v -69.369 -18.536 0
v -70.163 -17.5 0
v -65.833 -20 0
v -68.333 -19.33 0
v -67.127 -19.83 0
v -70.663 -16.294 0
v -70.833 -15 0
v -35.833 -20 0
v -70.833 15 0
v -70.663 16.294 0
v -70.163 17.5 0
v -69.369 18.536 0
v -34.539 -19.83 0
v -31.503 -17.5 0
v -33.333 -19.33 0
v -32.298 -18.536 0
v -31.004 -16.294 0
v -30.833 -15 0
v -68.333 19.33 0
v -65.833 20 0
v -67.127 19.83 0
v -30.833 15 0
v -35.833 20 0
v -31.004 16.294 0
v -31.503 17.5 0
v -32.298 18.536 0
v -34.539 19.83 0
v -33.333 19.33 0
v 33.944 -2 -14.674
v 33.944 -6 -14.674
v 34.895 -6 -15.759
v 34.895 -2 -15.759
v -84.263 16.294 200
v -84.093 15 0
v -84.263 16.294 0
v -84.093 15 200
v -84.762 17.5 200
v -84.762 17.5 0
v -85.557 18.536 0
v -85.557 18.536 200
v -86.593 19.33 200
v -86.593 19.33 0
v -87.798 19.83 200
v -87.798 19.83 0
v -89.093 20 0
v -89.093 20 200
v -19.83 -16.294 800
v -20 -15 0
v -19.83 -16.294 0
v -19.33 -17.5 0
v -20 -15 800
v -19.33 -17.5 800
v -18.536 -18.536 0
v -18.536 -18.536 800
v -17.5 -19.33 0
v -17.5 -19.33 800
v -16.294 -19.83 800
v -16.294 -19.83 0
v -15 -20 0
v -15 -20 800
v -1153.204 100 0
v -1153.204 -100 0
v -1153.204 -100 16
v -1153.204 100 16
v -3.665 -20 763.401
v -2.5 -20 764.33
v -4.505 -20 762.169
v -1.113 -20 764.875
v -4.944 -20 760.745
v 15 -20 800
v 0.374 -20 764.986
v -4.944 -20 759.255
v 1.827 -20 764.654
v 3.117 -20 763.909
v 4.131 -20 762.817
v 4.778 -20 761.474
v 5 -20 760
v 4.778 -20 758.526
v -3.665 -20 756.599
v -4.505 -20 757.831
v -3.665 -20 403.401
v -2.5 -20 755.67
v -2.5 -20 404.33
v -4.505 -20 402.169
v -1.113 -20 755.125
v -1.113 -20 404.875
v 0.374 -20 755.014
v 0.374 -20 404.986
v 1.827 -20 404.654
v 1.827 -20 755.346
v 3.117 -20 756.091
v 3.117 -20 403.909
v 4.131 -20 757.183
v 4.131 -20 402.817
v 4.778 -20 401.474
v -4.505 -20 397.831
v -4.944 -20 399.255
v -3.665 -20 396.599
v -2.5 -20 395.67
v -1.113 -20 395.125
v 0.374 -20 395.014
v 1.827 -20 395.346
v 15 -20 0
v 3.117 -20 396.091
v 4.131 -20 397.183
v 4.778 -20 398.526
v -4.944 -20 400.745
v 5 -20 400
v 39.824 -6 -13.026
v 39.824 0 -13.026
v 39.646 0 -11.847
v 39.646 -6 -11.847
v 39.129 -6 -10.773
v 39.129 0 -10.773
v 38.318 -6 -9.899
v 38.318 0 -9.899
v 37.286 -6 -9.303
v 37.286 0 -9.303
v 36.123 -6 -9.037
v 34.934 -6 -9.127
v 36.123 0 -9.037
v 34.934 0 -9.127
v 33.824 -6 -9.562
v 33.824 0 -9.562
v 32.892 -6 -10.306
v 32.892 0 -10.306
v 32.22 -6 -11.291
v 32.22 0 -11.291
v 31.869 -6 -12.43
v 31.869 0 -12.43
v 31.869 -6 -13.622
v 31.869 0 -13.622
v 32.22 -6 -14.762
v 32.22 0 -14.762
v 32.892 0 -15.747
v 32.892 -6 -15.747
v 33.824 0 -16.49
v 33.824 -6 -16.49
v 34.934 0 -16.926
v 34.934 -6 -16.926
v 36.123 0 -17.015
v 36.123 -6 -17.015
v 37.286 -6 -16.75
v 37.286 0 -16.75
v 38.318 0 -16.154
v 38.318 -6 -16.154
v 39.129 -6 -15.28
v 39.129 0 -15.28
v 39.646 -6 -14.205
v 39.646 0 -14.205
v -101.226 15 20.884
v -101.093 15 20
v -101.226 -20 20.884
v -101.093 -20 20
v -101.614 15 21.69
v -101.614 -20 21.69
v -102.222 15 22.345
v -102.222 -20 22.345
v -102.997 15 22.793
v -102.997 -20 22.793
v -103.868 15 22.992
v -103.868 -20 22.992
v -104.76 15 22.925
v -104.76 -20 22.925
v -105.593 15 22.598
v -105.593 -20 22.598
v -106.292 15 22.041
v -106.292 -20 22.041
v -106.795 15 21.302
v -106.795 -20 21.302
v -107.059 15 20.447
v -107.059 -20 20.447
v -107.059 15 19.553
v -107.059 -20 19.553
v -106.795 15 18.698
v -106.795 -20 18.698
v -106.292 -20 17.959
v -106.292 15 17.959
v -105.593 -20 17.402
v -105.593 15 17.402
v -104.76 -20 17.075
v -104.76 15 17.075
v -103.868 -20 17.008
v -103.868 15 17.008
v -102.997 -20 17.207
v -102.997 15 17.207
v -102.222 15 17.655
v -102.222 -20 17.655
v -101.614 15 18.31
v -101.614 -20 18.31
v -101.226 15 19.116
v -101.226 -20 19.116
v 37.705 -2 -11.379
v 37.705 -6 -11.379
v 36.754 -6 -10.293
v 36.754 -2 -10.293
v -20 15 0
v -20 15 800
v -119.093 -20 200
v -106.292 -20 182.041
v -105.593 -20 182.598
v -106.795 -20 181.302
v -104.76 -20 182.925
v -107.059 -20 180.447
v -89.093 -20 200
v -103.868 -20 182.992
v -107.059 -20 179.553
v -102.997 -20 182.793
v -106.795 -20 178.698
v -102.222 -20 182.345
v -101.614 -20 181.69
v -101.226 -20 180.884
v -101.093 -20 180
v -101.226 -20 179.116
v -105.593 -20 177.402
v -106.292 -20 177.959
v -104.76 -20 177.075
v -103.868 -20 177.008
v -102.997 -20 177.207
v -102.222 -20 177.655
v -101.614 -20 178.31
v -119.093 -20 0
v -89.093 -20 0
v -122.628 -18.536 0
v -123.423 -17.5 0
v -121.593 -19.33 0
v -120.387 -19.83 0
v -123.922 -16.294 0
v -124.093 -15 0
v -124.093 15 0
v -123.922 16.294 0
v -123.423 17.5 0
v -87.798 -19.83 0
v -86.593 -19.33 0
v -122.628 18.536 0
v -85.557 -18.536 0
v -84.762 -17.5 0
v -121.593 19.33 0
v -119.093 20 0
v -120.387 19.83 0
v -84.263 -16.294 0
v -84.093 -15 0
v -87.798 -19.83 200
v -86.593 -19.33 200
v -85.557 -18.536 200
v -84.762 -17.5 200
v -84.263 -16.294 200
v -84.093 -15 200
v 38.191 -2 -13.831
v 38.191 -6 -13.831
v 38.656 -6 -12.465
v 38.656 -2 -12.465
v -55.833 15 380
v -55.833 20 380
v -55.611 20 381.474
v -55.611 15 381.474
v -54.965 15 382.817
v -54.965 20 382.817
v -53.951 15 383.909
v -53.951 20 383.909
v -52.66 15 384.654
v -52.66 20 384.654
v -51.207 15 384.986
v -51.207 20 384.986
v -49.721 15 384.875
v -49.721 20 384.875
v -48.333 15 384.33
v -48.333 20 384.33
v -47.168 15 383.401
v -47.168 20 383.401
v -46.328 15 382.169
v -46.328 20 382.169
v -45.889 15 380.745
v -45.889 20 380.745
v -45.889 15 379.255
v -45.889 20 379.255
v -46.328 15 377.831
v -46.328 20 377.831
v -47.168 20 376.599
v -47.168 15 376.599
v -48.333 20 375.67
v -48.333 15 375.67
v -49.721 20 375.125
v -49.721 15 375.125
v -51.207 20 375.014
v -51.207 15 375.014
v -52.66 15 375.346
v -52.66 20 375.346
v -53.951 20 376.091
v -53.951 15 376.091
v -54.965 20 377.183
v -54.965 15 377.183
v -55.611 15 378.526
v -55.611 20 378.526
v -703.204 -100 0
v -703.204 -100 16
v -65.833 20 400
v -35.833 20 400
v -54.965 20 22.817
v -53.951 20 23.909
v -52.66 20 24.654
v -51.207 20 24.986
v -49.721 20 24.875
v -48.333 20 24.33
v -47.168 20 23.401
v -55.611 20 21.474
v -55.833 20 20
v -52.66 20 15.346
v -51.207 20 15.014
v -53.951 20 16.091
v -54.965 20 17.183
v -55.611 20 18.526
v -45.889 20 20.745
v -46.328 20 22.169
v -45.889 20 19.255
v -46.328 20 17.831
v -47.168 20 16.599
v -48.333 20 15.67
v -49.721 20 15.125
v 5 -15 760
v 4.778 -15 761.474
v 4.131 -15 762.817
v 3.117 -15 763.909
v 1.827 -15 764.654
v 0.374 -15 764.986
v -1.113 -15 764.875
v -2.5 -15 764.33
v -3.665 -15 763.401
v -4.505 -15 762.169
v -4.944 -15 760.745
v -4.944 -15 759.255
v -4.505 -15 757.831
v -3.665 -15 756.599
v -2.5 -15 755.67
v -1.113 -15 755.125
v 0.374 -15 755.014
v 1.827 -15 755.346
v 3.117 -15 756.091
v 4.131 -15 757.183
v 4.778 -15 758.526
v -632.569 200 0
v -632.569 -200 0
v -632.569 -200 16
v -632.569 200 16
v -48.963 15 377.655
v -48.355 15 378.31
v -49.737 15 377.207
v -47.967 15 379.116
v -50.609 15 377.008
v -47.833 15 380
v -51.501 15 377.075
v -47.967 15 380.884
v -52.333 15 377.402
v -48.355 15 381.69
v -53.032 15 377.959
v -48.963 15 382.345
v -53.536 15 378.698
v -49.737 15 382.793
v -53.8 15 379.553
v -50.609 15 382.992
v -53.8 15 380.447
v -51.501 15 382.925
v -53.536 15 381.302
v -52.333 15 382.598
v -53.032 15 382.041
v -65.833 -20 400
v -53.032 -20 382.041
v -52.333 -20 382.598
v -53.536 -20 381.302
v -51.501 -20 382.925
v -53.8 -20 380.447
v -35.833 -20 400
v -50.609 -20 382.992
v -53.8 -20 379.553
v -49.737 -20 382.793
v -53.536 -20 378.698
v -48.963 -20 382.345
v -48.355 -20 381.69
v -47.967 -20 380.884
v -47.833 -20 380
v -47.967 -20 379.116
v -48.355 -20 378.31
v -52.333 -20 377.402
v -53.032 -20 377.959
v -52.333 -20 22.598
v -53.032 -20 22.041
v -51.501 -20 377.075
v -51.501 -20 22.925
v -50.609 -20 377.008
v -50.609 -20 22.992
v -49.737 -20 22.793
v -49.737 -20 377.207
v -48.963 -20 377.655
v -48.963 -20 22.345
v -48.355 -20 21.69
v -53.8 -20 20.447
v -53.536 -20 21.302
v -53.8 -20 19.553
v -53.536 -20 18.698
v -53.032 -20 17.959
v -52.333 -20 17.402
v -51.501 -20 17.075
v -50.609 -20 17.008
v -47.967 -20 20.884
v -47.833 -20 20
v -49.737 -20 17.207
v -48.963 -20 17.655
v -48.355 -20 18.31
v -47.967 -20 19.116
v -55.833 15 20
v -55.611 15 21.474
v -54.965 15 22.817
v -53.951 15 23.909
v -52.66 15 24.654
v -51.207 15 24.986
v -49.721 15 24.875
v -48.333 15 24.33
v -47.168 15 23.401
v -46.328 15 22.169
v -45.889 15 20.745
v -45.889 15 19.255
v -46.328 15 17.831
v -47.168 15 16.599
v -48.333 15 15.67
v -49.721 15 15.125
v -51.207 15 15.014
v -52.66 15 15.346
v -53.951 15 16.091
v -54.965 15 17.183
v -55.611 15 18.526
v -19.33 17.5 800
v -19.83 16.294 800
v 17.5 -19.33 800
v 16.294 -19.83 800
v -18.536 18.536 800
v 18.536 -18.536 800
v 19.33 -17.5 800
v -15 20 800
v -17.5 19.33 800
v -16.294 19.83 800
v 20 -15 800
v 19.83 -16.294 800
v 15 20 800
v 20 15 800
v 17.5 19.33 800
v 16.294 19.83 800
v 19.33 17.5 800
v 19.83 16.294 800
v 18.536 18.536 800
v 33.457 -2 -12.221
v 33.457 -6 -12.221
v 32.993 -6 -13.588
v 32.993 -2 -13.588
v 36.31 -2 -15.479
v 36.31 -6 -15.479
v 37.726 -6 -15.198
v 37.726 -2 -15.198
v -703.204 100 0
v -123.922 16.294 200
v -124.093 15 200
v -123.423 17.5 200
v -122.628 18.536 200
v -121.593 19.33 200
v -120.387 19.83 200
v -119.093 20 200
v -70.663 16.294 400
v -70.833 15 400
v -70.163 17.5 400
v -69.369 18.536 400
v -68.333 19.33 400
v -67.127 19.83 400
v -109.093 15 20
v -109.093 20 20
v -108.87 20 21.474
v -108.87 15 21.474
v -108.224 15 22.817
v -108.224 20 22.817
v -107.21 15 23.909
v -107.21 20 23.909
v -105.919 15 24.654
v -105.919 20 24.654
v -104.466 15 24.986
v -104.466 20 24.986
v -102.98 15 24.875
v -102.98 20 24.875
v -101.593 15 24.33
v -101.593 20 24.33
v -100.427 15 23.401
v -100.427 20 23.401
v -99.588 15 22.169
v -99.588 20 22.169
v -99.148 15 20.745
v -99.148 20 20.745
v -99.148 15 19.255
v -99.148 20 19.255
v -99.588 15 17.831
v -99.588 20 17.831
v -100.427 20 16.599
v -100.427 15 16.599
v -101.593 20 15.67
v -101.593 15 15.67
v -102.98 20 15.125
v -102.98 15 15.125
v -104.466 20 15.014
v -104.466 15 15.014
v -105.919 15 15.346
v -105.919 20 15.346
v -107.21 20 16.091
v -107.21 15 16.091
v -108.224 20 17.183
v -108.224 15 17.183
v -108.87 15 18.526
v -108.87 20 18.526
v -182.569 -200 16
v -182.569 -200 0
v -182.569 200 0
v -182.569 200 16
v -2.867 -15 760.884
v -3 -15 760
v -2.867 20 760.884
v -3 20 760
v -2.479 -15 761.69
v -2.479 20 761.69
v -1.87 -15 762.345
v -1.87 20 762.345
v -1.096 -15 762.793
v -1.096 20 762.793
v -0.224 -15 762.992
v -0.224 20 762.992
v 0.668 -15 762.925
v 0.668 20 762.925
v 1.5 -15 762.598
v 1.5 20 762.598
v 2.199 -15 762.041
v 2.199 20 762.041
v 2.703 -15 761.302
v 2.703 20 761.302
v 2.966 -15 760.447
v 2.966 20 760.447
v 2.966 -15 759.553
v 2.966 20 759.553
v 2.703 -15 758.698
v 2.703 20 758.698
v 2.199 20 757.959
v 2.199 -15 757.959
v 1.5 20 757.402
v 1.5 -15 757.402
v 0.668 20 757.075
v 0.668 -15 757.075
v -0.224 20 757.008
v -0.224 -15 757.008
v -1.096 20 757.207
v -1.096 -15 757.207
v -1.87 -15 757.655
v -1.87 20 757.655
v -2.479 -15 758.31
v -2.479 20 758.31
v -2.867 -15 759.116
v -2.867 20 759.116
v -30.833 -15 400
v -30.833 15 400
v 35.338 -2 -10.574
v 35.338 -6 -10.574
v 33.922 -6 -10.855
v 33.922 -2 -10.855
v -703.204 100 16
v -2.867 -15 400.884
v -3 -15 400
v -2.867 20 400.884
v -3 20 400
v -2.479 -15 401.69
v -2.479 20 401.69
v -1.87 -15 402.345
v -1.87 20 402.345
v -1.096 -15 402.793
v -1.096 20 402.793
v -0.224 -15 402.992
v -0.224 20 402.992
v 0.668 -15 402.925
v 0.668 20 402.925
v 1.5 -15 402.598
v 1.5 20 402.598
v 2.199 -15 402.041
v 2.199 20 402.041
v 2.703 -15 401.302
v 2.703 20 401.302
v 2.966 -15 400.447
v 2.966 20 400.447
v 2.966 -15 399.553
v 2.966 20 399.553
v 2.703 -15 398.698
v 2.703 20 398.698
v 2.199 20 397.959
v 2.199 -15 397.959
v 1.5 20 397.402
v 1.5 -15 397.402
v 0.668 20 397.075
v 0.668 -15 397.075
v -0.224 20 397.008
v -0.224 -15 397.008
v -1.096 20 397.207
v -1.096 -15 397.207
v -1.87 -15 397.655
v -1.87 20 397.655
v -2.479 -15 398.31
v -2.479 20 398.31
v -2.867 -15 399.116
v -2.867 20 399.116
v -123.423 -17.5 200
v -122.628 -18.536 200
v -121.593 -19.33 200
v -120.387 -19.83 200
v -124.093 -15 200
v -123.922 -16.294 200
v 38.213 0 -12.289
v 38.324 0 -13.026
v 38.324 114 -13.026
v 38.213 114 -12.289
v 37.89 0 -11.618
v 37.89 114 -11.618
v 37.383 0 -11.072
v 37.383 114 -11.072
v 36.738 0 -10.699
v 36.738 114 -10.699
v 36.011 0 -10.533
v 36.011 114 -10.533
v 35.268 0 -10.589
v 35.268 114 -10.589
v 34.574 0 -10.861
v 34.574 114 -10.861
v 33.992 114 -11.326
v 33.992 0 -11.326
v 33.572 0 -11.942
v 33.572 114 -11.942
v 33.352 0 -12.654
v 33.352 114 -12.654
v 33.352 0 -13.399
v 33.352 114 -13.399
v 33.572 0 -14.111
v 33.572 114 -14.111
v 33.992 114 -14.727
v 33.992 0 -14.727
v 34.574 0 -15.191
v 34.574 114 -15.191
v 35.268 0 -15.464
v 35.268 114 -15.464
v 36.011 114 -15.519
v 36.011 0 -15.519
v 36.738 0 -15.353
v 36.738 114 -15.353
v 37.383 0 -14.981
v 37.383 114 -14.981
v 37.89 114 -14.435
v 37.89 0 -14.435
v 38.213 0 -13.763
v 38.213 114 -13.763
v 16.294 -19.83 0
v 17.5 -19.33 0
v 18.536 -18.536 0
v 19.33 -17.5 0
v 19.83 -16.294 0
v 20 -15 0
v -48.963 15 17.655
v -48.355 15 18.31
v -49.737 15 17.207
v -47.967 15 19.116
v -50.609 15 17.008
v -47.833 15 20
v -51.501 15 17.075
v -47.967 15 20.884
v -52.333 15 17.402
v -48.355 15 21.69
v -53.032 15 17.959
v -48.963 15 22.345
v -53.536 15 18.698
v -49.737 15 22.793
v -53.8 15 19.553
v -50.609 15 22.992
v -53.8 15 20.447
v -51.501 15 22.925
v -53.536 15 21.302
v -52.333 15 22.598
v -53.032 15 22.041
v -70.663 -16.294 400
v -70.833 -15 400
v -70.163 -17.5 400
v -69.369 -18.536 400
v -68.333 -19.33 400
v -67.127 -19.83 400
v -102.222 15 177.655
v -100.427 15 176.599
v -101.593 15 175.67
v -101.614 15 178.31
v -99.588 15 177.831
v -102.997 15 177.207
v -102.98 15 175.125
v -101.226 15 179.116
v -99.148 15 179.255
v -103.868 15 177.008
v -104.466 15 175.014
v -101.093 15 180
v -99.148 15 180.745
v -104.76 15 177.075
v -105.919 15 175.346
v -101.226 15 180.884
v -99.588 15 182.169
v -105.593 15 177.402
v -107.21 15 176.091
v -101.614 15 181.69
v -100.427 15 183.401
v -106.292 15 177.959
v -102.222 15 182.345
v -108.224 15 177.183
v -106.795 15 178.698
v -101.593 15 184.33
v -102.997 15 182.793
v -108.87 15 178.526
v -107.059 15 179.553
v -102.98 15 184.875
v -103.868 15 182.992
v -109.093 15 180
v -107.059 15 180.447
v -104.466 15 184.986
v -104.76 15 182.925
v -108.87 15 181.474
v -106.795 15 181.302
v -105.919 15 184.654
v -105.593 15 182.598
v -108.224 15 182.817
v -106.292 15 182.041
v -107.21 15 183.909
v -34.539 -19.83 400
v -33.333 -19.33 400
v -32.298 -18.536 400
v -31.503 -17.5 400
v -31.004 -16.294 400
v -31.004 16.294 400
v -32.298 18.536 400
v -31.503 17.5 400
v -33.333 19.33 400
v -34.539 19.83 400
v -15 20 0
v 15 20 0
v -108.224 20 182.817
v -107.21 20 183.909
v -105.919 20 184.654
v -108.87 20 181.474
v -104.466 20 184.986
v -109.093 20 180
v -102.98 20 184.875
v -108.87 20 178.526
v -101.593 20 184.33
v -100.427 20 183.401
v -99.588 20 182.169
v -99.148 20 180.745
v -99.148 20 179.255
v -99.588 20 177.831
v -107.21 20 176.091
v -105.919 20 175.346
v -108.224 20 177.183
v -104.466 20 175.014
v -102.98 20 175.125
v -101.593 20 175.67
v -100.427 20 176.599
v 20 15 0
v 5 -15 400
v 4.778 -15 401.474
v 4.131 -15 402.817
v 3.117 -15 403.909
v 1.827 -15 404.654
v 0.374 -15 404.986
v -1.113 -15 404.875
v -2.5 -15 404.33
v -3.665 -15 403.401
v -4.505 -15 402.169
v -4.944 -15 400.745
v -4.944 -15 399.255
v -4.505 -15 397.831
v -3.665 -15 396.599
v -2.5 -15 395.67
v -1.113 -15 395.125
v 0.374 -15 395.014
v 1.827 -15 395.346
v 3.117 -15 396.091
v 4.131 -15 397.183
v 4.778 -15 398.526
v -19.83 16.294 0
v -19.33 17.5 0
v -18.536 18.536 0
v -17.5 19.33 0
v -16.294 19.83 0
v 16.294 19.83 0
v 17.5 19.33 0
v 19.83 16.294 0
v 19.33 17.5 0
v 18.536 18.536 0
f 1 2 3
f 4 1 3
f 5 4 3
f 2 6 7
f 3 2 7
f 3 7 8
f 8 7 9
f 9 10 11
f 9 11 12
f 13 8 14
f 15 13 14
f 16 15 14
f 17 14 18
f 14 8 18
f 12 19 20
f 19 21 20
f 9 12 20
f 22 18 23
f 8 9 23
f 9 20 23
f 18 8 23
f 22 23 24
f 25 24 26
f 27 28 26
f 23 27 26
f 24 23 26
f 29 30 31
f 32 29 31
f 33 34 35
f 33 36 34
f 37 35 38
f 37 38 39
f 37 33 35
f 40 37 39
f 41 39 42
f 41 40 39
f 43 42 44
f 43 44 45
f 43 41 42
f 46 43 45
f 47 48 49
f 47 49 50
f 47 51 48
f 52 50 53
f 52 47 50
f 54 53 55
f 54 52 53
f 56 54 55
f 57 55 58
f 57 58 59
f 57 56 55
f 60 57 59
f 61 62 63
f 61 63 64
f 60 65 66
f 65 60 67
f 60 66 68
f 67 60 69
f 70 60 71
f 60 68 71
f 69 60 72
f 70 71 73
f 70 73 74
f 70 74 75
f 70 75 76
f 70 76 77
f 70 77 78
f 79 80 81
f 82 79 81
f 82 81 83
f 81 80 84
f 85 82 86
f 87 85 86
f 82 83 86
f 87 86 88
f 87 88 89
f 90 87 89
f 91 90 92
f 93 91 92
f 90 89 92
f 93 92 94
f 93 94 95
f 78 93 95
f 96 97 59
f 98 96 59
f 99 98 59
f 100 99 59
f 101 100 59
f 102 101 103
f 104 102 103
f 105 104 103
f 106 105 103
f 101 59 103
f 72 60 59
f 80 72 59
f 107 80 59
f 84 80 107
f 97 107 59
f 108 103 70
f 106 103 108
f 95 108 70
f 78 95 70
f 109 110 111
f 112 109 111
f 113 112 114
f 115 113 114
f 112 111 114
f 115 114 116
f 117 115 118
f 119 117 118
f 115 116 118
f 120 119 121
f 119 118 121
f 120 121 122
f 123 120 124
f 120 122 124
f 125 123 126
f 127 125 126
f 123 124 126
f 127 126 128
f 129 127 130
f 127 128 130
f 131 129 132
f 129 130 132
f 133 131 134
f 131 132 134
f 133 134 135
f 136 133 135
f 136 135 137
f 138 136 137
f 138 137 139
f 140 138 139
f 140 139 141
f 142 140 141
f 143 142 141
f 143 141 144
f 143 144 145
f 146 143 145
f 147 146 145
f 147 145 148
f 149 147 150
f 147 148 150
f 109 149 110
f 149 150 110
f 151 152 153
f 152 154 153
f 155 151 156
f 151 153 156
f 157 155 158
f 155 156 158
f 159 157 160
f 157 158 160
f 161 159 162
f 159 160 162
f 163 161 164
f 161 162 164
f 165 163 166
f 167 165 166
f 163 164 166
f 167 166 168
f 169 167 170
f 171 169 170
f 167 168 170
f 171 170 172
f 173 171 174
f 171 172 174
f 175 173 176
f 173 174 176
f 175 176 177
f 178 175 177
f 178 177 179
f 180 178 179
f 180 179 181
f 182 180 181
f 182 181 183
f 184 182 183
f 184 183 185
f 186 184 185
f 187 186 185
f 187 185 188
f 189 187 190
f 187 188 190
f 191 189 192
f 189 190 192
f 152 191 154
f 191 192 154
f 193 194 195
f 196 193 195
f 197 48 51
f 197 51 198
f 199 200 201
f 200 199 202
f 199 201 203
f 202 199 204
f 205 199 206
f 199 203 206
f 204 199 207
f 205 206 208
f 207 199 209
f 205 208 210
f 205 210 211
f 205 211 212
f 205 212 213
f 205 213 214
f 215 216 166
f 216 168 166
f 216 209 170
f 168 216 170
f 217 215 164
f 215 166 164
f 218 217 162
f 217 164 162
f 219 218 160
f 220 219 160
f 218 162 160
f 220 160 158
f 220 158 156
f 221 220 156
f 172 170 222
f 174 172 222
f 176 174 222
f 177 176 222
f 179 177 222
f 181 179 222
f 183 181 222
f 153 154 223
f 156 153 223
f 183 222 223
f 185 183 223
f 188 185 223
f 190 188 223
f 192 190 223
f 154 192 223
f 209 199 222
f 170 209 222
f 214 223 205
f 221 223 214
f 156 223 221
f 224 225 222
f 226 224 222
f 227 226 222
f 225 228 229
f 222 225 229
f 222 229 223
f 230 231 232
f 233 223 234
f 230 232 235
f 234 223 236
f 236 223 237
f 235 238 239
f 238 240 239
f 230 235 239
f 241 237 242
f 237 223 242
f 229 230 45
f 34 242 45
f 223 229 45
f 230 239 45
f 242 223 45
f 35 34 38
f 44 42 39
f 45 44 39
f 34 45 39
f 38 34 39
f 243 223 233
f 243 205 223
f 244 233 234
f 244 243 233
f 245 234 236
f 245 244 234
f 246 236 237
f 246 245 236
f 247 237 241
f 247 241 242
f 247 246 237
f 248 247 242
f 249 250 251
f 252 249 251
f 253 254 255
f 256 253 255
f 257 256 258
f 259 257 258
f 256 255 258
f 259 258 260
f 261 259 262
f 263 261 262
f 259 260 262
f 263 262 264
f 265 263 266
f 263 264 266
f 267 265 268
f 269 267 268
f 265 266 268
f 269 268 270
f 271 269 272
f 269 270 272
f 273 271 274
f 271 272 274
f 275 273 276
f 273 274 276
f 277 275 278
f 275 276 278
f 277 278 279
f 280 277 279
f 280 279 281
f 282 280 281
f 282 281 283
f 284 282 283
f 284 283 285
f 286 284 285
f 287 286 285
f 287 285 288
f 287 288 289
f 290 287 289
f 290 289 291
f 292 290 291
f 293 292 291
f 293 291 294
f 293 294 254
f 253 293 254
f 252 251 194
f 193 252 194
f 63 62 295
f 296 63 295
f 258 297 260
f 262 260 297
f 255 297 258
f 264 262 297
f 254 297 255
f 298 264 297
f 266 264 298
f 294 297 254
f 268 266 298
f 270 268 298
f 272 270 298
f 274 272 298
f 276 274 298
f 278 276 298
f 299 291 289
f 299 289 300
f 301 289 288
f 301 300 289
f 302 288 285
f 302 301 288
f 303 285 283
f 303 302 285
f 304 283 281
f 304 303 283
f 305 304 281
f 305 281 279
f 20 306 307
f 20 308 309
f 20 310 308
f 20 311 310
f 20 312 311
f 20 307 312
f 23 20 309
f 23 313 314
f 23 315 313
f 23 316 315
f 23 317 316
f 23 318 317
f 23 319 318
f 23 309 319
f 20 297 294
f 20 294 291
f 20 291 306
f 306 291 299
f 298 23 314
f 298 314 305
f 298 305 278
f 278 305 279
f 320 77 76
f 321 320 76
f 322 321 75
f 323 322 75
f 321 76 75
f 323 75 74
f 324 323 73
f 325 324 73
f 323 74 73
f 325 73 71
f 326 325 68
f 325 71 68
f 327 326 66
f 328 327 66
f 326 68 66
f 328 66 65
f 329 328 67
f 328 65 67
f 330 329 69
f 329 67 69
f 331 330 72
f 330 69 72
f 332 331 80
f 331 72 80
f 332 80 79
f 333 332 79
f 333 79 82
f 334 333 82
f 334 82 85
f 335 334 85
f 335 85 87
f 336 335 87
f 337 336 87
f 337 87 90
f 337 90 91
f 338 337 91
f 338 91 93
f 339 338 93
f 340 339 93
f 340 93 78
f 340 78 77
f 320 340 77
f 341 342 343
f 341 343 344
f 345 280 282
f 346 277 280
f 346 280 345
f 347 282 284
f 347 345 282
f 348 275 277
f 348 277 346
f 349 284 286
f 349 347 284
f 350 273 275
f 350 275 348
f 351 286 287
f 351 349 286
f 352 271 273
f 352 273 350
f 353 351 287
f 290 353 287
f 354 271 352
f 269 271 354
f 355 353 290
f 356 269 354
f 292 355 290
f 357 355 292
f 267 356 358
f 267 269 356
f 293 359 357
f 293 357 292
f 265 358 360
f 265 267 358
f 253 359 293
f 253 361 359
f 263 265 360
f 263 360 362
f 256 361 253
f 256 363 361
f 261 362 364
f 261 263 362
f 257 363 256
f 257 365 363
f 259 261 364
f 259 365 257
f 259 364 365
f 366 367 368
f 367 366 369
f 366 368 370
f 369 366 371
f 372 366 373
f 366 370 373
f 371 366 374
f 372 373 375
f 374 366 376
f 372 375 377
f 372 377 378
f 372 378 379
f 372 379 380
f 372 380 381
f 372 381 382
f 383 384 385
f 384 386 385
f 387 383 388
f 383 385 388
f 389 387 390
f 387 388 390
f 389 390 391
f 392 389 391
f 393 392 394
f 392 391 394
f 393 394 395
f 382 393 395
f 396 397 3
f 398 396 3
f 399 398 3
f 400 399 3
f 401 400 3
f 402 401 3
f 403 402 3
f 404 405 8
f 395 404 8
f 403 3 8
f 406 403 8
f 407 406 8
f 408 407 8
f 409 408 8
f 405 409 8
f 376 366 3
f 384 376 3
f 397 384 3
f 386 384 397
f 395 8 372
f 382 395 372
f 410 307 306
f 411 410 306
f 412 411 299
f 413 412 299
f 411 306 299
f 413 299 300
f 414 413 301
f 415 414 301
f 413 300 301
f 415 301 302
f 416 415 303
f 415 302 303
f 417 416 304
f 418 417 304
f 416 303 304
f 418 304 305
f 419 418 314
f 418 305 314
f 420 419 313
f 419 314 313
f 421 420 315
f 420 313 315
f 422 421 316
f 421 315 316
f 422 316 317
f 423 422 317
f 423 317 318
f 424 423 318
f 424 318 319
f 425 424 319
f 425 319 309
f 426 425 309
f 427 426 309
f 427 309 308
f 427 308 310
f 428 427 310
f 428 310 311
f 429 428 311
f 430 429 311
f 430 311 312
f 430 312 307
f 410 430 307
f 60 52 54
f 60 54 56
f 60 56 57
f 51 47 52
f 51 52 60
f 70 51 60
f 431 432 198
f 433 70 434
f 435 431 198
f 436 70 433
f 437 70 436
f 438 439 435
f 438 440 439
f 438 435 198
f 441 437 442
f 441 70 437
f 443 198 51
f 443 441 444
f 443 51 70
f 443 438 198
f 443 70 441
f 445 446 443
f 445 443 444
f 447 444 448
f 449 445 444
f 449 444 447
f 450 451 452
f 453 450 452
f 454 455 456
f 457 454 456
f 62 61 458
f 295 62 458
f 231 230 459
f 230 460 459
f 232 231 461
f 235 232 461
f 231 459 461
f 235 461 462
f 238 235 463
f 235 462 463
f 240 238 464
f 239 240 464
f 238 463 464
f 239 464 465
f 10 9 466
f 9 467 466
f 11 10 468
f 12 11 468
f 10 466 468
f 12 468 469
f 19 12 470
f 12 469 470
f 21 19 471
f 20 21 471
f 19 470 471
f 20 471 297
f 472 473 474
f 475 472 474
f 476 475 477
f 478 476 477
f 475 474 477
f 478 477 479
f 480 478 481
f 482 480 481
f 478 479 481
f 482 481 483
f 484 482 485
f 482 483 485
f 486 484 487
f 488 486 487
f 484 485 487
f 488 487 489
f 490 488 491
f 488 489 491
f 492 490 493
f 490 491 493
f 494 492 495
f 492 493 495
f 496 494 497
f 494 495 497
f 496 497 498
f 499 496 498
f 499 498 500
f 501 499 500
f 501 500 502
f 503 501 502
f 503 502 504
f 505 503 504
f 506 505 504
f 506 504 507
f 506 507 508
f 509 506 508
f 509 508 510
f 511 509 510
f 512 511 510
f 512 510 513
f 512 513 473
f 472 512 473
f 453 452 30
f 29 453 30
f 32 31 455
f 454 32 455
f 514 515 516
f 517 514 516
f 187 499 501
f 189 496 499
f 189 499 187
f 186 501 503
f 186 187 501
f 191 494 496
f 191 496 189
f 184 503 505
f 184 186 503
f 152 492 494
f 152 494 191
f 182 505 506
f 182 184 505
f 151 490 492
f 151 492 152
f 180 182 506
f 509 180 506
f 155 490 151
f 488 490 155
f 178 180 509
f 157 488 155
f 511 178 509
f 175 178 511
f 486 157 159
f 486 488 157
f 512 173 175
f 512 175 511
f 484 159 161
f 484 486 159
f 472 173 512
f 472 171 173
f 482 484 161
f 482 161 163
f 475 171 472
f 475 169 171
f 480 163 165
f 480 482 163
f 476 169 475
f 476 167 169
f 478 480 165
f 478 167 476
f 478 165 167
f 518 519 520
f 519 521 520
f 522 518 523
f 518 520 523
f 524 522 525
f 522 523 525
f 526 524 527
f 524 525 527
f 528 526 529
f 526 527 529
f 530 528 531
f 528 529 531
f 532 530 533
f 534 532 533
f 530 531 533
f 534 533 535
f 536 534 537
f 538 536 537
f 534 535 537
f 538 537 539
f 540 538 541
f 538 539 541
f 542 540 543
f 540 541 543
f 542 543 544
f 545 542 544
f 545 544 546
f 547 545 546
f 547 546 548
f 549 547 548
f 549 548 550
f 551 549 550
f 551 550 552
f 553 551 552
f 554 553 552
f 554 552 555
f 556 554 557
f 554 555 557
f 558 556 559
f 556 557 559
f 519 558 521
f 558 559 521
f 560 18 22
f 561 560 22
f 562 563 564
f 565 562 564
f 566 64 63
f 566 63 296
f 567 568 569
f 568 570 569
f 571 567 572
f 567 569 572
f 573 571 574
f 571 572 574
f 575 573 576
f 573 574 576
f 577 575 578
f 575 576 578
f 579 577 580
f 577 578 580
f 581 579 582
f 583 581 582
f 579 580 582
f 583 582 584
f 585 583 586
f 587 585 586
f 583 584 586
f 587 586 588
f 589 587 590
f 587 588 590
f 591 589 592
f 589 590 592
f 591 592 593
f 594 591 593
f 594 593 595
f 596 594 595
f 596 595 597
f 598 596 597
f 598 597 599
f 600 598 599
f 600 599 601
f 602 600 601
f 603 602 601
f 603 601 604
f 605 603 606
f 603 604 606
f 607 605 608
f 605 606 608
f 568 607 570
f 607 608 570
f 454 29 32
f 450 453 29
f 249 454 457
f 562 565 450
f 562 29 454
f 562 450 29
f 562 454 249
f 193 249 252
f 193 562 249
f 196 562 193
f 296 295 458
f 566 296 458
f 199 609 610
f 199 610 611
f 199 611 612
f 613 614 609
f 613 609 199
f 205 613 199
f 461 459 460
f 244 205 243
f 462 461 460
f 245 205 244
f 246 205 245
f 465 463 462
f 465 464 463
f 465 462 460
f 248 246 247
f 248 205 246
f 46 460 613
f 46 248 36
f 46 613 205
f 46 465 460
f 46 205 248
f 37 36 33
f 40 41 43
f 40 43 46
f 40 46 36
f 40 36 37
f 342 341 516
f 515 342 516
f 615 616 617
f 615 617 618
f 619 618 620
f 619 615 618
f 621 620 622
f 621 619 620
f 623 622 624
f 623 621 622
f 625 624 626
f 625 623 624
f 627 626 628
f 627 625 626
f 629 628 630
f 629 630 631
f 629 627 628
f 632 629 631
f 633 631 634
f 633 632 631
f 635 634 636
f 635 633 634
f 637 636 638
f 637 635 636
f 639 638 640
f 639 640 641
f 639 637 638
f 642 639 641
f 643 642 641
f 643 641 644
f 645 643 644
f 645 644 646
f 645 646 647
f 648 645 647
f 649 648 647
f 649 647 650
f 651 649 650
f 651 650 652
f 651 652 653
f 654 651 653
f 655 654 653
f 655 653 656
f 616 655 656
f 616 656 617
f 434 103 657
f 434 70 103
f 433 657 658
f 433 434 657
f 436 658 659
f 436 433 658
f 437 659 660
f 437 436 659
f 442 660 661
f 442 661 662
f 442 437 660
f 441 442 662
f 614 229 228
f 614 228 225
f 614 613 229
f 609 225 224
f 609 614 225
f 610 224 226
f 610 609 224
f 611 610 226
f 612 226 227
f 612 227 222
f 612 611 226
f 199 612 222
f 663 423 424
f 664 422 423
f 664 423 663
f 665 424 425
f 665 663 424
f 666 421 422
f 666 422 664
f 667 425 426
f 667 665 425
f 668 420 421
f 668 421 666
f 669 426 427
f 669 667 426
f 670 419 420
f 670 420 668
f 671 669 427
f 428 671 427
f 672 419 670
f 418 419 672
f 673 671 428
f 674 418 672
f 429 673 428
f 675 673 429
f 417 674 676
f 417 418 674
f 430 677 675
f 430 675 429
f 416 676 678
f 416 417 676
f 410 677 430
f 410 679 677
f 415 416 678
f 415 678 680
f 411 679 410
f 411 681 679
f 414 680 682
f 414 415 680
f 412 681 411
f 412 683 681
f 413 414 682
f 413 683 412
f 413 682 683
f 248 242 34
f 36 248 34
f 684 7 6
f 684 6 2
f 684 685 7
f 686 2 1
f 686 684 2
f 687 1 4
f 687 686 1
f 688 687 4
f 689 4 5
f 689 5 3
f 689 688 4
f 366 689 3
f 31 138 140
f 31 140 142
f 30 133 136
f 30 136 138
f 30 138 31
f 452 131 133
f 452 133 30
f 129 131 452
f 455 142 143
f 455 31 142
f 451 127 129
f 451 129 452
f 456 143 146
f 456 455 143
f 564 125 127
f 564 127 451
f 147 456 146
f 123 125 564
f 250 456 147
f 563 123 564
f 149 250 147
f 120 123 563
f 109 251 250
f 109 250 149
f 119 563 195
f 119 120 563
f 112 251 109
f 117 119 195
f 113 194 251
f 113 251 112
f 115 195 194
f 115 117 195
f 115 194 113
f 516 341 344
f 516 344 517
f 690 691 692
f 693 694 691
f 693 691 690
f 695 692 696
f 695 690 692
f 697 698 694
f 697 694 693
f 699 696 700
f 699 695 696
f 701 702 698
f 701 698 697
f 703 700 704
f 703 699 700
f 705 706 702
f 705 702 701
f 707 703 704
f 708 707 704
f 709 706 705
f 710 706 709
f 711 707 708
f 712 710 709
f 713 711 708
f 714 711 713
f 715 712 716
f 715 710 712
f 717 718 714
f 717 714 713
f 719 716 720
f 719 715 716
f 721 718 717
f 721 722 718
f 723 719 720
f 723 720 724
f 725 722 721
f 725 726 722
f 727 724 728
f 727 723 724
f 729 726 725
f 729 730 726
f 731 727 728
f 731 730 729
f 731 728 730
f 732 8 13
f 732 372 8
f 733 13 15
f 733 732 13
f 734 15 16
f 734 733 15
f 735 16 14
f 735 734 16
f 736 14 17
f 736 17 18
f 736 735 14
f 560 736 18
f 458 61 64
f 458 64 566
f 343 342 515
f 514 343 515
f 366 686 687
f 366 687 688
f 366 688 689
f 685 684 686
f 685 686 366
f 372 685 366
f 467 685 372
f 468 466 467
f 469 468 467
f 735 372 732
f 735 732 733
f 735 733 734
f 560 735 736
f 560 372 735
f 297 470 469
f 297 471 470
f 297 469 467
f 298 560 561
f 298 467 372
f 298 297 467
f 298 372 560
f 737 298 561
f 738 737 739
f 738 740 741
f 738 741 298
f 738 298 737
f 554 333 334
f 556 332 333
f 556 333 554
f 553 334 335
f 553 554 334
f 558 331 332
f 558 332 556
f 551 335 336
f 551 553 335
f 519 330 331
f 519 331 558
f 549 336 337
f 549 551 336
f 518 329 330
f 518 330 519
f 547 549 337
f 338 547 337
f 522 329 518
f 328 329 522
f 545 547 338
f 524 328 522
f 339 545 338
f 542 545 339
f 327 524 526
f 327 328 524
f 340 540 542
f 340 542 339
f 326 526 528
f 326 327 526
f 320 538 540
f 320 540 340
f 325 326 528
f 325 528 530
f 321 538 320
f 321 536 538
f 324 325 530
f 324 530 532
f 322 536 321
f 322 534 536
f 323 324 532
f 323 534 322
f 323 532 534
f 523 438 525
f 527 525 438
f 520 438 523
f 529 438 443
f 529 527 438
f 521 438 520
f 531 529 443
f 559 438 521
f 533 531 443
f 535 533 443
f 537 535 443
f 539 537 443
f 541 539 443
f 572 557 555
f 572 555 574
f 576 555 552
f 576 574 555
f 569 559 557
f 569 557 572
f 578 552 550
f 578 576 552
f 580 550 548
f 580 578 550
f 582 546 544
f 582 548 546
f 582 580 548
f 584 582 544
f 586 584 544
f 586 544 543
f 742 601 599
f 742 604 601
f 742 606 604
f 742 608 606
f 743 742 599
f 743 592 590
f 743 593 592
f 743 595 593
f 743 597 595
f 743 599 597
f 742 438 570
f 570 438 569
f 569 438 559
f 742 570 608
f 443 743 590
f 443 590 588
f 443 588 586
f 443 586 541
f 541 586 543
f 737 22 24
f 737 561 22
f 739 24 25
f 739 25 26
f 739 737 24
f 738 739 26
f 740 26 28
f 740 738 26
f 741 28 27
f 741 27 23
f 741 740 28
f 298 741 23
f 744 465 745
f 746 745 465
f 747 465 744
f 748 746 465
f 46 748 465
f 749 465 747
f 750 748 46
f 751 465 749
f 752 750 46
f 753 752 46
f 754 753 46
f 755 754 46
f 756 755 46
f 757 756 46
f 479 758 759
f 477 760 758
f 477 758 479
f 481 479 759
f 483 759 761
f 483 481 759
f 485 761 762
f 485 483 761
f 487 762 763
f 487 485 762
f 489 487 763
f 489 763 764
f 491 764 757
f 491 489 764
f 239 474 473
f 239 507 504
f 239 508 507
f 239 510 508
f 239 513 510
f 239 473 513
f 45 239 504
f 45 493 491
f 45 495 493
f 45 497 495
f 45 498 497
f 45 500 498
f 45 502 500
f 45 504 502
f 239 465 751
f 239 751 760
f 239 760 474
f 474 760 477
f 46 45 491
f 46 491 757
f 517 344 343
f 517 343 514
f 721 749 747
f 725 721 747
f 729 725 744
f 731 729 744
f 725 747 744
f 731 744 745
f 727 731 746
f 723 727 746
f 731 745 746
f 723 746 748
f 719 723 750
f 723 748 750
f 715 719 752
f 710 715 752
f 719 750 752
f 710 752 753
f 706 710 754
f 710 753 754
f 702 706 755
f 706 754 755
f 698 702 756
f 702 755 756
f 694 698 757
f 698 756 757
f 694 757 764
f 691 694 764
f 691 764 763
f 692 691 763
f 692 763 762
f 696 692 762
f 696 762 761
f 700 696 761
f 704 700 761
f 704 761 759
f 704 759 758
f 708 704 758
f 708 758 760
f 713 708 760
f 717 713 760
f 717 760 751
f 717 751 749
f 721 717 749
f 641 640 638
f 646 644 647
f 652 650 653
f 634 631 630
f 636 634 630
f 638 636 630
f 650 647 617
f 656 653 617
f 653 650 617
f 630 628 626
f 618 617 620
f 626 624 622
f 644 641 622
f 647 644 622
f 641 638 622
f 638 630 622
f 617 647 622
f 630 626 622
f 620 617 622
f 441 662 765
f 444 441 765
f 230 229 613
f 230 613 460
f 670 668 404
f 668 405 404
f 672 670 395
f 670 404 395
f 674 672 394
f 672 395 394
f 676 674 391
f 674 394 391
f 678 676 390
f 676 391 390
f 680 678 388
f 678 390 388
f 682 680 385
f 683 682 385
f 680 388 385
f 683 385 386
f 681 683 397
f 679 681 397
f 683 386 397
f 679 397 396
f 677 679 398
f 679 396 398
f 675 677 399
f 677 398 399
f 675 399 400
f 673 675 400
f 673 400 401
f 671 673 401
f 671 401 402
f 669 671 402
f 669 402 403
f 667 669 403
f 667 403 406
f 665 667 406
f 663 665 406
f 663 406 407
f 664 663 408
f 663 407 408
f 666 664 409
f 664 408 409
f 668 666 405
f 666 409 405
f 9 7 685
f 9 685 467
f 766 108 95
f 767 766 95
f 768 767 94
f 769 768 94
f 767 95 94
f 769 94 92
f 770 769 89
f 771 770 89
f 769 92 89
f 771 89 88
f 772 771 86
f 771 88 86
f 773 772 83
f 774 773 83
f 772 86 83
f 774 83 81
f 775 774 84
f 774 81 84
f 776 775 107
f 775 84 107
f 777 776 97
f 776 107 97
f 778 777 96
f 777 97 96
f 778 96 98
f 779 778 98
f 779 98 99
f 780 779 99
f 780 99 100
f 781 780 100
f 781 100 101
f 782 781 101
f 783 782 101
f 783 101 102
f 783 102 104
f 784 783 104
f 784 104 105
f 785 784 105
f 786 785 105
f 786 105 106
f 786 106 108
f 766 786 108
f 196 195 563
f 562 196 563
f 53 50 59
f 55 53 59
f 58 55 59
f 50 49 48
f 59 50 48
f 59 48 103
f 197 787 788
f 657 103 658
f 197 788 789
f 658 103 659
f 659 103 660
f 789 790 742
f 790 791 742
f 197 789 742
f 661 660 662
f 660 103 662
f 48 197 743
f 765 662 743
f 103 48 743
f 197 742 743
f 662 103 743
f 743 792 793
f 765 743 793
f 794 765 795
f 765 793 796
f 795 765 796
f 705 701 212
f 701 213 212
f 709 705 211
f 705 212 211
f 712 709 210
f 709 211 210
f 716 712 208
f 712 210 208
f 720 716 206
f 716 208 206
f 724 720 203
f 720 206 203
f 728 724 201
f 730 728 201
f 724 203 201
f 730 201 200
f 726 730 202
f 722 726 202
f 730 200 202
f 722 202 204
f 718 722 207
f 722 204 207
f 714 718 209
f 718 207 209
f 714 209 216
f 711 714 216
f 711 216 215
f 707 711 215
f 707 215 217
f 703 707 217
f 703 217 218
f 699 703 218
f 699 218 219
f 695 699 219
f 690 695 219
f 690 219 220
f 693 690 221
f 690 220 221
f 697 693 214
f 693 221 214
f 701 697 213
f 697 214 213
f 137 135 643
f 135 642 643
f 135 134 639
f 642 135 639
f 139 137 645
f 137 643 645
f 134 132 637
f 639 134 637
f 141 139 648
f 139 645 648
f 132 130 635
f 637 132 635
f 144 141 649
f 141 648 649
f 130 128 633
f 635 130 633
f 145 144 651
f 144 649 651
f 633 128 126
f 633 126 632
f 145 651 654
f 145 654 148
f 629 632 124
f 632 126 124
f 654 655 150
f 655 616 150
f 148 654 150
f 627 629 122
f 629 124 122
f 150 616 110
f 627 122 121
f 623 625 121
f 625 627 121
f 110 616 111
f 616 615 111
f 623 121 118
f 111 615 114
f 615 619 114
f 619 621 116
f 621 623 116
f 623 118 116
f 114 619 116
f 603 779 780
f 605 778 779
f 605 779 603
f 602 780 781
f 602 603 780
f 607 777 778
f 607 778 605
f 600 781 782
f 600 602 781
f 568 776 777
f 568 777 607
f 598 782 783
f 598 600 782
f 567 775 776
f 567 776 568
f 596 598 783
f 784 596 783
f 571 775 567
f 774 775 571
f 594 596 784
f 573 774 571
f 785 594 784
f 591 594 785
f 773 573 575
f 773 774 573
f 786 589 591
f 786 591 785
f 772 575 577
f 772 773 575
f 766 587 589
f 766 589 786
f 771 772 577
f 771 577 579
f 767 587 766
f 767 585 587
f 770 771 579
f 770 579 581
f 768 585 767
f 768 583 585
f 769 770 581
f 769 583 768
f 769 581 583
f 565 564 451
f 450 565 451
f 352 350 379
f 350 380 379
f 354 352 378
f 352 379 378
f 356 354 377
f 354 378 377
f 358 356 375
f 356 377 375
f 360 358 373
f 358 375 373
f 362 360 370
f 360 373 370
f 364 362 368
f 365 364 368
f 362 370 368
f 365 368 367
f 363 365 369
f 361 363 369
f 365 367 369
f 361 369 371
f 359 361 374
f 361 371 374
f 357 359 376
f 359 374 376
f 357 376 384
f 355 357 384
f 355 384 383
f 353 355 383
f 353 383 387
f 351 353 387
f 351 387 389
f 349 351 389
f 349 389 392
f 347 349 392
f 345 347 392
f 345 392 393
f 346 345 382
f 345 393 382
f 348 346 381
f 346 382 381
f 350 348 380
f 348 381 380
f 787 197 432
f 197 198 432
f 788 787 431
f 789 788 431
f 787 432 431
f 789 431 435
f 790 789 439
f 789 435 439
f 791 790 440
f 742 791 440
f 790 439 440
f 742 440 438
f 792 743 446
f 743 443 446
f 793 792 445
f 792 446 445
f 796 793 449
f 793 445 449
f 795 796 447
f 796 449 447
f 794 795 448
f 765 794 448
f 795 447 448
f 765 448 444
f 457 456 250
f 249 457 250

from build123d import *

# Parameters (mm, degrees)
F0_W            = 40
F0_H            = 40
F1_DEPTH        = 800
F3_D            = 6
F3_CBORE_D      = 10
F3_CBORE_DEPTH  = 5
F4_R            = 5
F5_R            = 4
F6_DEPTH        = 6
F7_R            = 2.5
F8_DEPTH        = 120
F10_DEPTH       = 4
F11_W           = 40
F11_H           = 40
F12_DEPTH       = 400
F13_R           = 5
F15_D           = 6
F15_CBORE_D     = 10
F15_CBORE_DEPTH = 5
F16_W           = 40
F16_H           = 40
F17_DEPTH       = 200
F18_R           = 5
F20_D           = 6
F20_CBORE_D     = 10
F20_CBORE_DEPTH = 5
F21_W           = 450
F21_H           = 400
F22_DEPTH       = 16
F23_W           = 450
F23_H           = 200
F24_DEPTH       = 16


with BuildPart() as f1:
    # F0 (on Top) → F1 (new body)
    with BuildSketch(Plane.XY):
        Rectangle(F0_W, F0_H)
    extrude(amount=F1_DEPTH)

    # F3 (through all)
    with Locations(Plane.XZ.offset(20)):
        with Locations((0, 760), (0, 400)):
            CounterBoreHole(F3_D / 2, F3_CBORE_D / 2, F3_CBORE_DEPTH)

    # F4
    f4_edges = [f1.edges().sort_by_distance(p)[0] for p in [
        (-20, 20, 400),
        (20, 20, 400),
        (-20, -20, 400),
        (20, -20, 400),
    ]]
    fillet(f4_edges, radius=F4_R)


with BuildPart() as f6:
    # F5 (on Front) → F6 (new body)
    with BuildSketch(Plane.XZ):
        with Locations((35.8241572976, -13.0263091996)):
            Circle(F5_R)
    extrude(amount=F6_DEPTH)

    # F7 (on face) → F8 (join)
    with BuildSketch(Plane.XZ.offset(6)):
        with Locations((35.8241572976, -13.0263091996)):
            Circle(F7_R)
    extrude(amount=-F8_DEPTH)

    # F9 (on face) → F10 (cut)
    with BuildSketch(Plane.XZ.offset(6)):
        with BuildLine():
            ThreePointArc((38.1910076976, -13.8313055873), (38.2906452866, -13.4342761101), (38.3241572976, -13.0263091996))
            ThreePointArc((38.3241572976, -13.0263091996), (38.1641820372, -12.1463749873), (37.7047299232, -11.3790549387))
            ThreePointArc((37.7047299232, -11.3790549387), (36.6291537099, -10.659458808), (35.3378793156, -10.574058453))
            ThreePointArc((35.3378793156, -10.574058453), (34.1769029635, -11.1457366382), (33.4573069705, -12.2213125976))
            ThreePointArc((33.4573069705, -12.2213125976), (33.3719064931, -13.5125868896), (33.9435846721, -14.6735634605))
            ThreePointArc((33.9435846721, -14.6735634605), (35.0191607987, -15.3931595618), (36.3104351001, -15.4785599818))
            ThreePointArc((36.3104351001, -15.4785599818), (37.471411648, -14.9068817468), (38.1910076976, -13.8313055873))
        make_face()
        with BuildLine():
            ThreePointArc((37.7047299232, -11.3790549387), (38.1641820372, -12.1463749873), (38.3241572976, -13.0263091996))
            ThreePointArc((38.3241572976, -13.0263091996), (38.2906452866, -13.4342761101), (38.1910076976, -13.8313055873))
            Line((38.1910076976, -13.8313055873), (38.6557725839, -12.4648038982))
            Line((38.6557725839, -12.4648038982), (37.7047299232, -11.3790549387))
        make_face()
        with BuildLine():
            ThreePointArc((35.3378793156, -10.574058453), (36.6291537099, -10.659458808), (37.7047299232, -11.3790549387))
            Line((37.7047299232, -11.3790549387), (36.7536870854, -10.2933057772))
            Line((36.7536870854, -10.2933057772), (35.3378793156, -10.574058453))
        make_face()
        with BuildLine():
            Line((37.7262427962, -15.1978073206), (38.1910076976, -13.8313055873))
            ThreePointArc((38.1910076976, -13.8313055873), (37.471411648, -14.9068817468), (36.3104351001, -15.4785599818))
            Line((36.3104351001, -15.4785599818), (37.7262427962, -15.1978073206))
        make_face()
        with BuildLine():
            ThreePointArc((33.4573069705, -12.2213125976), (34.1769029635, -11.1457366382), (35.3378793156, -10.574058453))
            Line((35.3378793156, -10.574058453), (33.922071799, -10.8548110787))
            Line((33.922071799, -10.8548110787), (33.4573069705, -12.2213125976))
        make_face()
        with BuildLine():
            Line((34.8946275099, -15.7593126221), (36.3104351001, -15.4785599818))
            ThreePointArc((36.3104351001, -15.4785599818), (35.0191607987, -15.3931595618), (33.9435846721, -14.6735634605))
            Line((33.9435846721, -14.6735634605), (34.8946275099, -15.7593126221))
        make_face()
        with BuildLine():
            ThreePointArc((33.9435846721, -14.6735634605), (33.3719064931, -13.5125868896), (33.4573069705, -12.2213125976))
            Line((33.4573069705, -12.2213125976), (32.9925420113, -13.5878145011))
            Line((32.9925420113, -13.5878145011), (33.9435846721, -14.6735634605))
        make_face()
    extrude(amount=-F10_DEPTH, mode=Mode.SUBTRACT)


with BuildPart() as f12:
    # F11 (on Top) → F12 (new body)
    with BuildSketch(Plane.XY):
        with Locations((-50.8333270538, 0)):
            Rectangle(F11_W, F11_H)
    extrude(amount=F12_DEPTH)

    # F13
    f13_edges = [f12.edges().sort_by_distance(p)[0] for p in [
        (-70.833327, -20, 200),
        (-30.833327, -20, 200),
        (-30.833327, 20, 200),
        (-70.833327, 20, 200),
    ]]
    fillet(f13_edges, radius=F13_R)

    # F15 (through all)
    with Locations(Plane(origin=(0, 20, 0), x_dir=(-1, 0, 0), z_dir=(0, 1, 0))):
        with Locations((50.8333270538, 20), (50.8333270538, 380)):
            CounterBoreHole(F15_D / 2, F15_CBORE_D / 2, F15_CBORE_DEPTH)


with BuildPart() as f17:
    # F16 (on Top) → F17 (new body)
    with BuildSketch(Plane.XY):
        with Locations((-104.0925830603, 0)):
            Rectangle(F16_W, F16_H)
    extrude(amount=F17_DEPTH)

    # F18
    f18_edges = [f17.edges().sort_by_distance(p)[0] for p in [
        (-124.092583, 20, 100),
        (-84.092583, 20, 100),
        (-124.092583, -20, 100),
        (-84.092583, -20, 100),
    ]]
    fillet(f18_edges, radius=F18_R)

    # F20 (through all)
    with Locations(Plane(origin=(0, 20, 0), x_dir=(-1, 0, 0), z_dir=(0, 1, 0))):
        with Locations((104.0925830603, 20), (104.0925830603, 180)):
            CounterBoreHole(F20_D / 2, F20_CBORE_D / 2, F20_CBORE_DEPTH)


with BuildPart() as f22:
    # F21 (on Top) → F22 (new body)
    with BuildSketch(Plane.XY):
        with Locations((-407.5689315796, 0)):
            Rectangle(F21_W, F21_H)
    extrude(amount=F22_DEPTH)


with BuildPart() as f24:
    # F23 (on Top) → F24 (new body)
    with BuildSketch(Plane.XY):
        with Locations((-928.203523159, 0)):
            Rectangle(F23_W, F23_H)
    extrude(amount=F24_DEPTH)


solid = Compound([f1.part, f6.part, f12.part, f17.part, f22.part, f24.part])
